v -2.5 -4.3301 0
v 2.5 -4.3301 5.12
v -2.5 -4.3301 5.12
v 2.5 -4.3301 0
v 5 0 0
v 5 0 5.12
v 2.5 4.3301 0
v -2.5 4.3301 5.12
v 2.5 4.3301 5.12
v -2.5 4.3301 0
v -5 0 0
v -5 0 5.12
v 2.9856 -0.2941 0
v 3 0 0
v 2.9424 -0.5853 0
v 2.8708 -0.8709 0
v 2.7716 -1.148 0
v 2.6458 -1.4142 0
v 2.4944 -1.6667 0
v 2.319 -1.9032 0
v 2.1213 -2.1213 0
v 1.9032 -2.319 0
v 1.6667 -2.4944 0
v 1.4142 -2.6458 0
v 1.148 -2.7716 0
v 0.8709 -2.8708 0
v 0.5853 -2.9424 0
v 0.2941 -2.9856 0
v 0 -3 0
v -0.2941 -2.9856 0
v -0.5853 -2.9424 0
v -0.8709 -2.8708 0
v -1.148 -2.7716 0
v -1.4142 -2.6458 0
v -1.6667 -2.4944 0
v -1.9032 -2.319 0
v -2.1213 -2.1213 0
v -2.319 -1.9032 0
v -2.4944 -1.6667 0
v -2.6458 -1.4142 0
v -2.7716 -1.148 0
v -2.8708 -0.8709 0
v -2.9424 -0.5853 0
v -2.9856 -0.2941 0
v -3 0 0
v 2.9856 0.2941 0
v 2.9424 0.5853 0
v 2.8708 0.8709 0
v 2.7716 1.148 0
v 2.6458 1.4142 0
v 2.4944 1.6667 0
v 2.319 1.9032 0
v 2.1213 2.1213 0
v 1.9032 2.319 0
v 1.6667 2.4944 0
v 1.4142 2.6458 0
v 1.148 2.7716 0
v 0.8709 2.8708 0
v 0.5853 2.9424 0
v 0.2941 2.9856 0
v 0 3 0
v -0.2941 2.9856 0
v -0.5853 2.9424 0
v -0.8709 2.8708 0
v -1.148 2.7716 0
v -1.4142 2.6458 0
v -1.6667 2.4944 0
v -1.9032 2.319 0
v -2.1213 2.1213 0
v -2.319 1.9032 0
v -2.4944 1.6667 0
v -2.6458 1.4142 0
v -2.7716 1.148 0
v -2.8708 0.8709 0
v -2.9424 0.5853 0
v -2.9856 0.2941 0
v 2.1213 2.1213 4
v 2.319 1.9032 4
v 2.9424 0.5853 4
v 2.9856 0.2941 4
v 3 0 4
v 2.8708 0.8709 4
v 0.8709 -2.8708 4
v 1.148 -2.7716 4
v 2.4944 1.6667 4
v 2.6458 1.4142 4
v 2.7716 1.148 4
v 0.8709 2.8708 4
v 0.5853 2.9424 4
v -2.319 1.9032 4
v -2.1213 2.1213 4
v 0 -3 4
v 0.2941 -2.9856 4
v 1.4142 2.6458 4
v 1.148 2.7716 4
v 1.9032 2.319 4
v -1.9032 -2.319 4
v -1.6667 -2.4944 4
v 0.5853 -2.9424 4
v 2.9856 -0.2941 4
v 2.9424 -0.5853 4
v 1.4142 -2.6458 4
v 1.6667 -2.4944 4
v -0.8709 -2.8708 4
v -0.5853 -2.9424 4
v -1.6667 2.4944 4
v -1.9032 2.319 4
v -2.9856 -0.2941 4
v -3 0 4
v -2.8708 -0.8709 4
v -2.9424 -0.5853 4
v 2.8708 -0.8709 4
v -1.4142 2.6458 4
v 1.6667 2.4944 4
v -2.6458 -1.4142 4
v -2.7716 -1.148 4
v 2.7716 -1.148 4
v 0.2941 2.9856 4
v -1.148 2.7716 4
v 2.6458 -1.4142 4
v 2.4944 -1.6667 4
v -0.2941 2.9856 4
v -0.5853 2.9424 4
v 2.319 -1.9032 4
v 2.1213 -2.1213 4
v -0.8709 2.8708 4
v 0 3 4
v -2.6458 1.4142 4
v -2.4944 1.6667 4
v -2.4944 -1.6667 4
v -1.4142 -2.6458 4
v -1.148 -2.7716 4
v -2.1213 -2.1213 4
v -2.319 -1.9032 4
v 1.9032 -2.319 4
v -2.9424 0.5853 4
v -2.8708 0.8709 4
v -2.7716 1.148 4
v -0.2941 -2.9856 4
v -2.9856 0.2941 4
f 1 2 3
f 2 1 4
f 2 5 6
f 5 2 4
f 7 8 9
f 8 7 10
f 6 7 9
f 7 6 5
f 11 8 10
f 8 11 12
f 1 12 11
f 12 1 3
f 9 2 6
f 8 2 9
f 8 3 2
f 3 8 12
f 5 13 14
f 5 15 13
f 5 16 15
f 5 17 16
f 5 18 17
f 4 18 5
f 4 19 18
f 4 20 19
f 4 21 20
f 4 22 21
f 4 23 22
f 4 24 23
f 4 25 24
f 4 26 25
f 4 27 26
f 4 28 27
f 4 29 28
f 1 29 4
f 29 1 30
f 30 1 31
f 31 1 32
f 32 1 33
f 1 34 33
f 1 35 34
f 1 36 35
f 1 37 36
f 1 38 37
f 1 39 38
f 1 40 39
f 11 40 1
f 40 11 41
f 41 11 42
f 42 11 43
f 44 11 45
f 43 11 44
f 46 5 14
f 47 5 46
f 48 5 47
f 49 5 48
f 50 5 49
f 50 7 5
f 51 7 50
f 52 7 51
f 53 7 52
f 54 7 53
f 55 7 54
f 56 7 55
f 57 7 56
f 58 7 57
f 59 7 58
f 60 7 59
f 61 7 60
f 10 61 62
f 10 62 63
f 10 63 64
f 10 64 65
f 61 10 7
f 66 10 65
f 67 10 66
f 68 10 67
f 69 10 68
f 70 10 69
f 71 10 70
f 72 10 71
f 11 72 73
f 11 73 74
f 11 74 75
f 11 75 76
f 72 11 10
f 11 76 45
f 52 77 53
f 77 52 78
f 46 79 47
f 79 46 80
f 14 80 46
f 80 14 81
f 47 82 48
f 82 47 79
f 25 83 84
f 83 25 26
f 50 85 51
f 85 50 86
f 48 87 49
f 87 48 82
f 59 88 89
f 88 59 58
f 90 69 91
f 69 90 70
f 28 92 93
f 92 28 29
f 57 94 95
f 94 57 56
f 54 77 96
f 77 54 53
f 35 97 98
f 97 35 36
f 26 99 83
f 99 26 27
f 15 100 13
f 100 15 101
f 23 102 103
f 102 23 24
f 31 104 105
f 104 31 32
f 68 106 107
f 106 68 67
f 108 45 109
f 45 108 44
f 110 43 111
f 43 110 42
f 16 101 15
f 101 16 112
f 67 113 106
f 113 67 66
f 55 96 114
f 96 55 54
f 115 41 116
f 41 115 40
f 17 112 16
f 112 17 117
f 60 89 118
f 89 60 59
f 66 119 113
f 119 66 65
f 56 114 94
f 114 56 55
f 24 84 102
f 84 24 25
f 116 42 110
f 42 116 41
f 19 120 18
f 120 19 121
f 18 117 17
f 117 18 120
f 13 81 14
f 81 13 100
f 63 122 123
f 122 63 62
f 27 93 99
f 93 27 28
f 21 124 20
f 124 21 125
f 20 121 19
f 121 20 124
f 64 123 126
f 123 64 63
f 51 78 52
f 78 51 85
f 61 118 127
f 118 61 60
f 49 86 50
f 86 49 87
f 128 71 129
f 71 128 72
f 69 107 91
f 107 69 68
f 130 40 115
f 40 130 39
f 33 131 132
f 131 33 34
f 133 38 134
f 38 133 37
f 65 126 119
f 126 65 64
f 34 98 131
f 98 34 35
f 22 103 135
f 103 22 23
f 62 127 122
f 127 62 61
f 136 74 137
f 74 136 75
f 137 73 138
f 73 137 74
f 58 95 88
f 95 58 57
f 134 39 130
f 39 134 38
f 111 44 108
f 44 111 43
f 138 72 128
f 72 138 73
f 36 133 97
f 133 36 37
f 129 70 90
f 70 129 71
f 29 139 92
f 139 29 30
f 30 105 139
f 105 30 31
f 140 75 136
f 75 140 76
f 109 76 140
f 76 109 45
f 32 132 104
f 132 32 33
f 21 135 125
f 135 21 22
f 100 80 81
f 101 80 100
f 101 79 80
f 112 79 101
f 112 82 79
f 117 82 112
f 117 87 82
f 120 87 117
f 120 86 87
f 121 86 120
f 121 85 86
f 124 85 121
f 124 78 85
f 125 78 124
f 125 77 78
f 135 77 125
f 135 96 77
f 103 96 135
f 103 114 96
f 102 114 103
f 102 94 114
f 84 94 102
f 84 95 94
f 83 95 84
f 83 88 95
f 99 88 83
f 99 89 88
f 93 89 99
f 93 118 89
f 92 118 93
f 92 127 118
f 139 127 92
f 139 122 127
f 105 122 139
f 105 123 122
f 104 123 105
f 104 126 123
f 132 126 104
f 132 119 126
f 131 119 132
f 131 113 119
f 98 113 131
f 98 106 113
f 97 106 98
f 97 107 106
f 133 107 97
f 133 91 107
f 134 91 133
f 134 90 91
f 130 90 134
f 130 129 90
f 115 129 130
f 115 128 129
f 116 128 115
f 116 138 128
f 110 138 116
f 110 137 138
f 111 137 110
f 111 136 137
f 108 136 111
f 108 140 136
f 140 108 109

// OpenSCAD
module hex_nut() {
    difference() {
        // Hexagonal prism
        scale([10/2, 10/2, 3.2/2])
            cylinder(h=3.2, r=1, $fn=6);
        // Circular hole
        translate([0, 0, -1])
            cylinder(h=5, r=3, $fn=64);
    }
}

hex_nut();
